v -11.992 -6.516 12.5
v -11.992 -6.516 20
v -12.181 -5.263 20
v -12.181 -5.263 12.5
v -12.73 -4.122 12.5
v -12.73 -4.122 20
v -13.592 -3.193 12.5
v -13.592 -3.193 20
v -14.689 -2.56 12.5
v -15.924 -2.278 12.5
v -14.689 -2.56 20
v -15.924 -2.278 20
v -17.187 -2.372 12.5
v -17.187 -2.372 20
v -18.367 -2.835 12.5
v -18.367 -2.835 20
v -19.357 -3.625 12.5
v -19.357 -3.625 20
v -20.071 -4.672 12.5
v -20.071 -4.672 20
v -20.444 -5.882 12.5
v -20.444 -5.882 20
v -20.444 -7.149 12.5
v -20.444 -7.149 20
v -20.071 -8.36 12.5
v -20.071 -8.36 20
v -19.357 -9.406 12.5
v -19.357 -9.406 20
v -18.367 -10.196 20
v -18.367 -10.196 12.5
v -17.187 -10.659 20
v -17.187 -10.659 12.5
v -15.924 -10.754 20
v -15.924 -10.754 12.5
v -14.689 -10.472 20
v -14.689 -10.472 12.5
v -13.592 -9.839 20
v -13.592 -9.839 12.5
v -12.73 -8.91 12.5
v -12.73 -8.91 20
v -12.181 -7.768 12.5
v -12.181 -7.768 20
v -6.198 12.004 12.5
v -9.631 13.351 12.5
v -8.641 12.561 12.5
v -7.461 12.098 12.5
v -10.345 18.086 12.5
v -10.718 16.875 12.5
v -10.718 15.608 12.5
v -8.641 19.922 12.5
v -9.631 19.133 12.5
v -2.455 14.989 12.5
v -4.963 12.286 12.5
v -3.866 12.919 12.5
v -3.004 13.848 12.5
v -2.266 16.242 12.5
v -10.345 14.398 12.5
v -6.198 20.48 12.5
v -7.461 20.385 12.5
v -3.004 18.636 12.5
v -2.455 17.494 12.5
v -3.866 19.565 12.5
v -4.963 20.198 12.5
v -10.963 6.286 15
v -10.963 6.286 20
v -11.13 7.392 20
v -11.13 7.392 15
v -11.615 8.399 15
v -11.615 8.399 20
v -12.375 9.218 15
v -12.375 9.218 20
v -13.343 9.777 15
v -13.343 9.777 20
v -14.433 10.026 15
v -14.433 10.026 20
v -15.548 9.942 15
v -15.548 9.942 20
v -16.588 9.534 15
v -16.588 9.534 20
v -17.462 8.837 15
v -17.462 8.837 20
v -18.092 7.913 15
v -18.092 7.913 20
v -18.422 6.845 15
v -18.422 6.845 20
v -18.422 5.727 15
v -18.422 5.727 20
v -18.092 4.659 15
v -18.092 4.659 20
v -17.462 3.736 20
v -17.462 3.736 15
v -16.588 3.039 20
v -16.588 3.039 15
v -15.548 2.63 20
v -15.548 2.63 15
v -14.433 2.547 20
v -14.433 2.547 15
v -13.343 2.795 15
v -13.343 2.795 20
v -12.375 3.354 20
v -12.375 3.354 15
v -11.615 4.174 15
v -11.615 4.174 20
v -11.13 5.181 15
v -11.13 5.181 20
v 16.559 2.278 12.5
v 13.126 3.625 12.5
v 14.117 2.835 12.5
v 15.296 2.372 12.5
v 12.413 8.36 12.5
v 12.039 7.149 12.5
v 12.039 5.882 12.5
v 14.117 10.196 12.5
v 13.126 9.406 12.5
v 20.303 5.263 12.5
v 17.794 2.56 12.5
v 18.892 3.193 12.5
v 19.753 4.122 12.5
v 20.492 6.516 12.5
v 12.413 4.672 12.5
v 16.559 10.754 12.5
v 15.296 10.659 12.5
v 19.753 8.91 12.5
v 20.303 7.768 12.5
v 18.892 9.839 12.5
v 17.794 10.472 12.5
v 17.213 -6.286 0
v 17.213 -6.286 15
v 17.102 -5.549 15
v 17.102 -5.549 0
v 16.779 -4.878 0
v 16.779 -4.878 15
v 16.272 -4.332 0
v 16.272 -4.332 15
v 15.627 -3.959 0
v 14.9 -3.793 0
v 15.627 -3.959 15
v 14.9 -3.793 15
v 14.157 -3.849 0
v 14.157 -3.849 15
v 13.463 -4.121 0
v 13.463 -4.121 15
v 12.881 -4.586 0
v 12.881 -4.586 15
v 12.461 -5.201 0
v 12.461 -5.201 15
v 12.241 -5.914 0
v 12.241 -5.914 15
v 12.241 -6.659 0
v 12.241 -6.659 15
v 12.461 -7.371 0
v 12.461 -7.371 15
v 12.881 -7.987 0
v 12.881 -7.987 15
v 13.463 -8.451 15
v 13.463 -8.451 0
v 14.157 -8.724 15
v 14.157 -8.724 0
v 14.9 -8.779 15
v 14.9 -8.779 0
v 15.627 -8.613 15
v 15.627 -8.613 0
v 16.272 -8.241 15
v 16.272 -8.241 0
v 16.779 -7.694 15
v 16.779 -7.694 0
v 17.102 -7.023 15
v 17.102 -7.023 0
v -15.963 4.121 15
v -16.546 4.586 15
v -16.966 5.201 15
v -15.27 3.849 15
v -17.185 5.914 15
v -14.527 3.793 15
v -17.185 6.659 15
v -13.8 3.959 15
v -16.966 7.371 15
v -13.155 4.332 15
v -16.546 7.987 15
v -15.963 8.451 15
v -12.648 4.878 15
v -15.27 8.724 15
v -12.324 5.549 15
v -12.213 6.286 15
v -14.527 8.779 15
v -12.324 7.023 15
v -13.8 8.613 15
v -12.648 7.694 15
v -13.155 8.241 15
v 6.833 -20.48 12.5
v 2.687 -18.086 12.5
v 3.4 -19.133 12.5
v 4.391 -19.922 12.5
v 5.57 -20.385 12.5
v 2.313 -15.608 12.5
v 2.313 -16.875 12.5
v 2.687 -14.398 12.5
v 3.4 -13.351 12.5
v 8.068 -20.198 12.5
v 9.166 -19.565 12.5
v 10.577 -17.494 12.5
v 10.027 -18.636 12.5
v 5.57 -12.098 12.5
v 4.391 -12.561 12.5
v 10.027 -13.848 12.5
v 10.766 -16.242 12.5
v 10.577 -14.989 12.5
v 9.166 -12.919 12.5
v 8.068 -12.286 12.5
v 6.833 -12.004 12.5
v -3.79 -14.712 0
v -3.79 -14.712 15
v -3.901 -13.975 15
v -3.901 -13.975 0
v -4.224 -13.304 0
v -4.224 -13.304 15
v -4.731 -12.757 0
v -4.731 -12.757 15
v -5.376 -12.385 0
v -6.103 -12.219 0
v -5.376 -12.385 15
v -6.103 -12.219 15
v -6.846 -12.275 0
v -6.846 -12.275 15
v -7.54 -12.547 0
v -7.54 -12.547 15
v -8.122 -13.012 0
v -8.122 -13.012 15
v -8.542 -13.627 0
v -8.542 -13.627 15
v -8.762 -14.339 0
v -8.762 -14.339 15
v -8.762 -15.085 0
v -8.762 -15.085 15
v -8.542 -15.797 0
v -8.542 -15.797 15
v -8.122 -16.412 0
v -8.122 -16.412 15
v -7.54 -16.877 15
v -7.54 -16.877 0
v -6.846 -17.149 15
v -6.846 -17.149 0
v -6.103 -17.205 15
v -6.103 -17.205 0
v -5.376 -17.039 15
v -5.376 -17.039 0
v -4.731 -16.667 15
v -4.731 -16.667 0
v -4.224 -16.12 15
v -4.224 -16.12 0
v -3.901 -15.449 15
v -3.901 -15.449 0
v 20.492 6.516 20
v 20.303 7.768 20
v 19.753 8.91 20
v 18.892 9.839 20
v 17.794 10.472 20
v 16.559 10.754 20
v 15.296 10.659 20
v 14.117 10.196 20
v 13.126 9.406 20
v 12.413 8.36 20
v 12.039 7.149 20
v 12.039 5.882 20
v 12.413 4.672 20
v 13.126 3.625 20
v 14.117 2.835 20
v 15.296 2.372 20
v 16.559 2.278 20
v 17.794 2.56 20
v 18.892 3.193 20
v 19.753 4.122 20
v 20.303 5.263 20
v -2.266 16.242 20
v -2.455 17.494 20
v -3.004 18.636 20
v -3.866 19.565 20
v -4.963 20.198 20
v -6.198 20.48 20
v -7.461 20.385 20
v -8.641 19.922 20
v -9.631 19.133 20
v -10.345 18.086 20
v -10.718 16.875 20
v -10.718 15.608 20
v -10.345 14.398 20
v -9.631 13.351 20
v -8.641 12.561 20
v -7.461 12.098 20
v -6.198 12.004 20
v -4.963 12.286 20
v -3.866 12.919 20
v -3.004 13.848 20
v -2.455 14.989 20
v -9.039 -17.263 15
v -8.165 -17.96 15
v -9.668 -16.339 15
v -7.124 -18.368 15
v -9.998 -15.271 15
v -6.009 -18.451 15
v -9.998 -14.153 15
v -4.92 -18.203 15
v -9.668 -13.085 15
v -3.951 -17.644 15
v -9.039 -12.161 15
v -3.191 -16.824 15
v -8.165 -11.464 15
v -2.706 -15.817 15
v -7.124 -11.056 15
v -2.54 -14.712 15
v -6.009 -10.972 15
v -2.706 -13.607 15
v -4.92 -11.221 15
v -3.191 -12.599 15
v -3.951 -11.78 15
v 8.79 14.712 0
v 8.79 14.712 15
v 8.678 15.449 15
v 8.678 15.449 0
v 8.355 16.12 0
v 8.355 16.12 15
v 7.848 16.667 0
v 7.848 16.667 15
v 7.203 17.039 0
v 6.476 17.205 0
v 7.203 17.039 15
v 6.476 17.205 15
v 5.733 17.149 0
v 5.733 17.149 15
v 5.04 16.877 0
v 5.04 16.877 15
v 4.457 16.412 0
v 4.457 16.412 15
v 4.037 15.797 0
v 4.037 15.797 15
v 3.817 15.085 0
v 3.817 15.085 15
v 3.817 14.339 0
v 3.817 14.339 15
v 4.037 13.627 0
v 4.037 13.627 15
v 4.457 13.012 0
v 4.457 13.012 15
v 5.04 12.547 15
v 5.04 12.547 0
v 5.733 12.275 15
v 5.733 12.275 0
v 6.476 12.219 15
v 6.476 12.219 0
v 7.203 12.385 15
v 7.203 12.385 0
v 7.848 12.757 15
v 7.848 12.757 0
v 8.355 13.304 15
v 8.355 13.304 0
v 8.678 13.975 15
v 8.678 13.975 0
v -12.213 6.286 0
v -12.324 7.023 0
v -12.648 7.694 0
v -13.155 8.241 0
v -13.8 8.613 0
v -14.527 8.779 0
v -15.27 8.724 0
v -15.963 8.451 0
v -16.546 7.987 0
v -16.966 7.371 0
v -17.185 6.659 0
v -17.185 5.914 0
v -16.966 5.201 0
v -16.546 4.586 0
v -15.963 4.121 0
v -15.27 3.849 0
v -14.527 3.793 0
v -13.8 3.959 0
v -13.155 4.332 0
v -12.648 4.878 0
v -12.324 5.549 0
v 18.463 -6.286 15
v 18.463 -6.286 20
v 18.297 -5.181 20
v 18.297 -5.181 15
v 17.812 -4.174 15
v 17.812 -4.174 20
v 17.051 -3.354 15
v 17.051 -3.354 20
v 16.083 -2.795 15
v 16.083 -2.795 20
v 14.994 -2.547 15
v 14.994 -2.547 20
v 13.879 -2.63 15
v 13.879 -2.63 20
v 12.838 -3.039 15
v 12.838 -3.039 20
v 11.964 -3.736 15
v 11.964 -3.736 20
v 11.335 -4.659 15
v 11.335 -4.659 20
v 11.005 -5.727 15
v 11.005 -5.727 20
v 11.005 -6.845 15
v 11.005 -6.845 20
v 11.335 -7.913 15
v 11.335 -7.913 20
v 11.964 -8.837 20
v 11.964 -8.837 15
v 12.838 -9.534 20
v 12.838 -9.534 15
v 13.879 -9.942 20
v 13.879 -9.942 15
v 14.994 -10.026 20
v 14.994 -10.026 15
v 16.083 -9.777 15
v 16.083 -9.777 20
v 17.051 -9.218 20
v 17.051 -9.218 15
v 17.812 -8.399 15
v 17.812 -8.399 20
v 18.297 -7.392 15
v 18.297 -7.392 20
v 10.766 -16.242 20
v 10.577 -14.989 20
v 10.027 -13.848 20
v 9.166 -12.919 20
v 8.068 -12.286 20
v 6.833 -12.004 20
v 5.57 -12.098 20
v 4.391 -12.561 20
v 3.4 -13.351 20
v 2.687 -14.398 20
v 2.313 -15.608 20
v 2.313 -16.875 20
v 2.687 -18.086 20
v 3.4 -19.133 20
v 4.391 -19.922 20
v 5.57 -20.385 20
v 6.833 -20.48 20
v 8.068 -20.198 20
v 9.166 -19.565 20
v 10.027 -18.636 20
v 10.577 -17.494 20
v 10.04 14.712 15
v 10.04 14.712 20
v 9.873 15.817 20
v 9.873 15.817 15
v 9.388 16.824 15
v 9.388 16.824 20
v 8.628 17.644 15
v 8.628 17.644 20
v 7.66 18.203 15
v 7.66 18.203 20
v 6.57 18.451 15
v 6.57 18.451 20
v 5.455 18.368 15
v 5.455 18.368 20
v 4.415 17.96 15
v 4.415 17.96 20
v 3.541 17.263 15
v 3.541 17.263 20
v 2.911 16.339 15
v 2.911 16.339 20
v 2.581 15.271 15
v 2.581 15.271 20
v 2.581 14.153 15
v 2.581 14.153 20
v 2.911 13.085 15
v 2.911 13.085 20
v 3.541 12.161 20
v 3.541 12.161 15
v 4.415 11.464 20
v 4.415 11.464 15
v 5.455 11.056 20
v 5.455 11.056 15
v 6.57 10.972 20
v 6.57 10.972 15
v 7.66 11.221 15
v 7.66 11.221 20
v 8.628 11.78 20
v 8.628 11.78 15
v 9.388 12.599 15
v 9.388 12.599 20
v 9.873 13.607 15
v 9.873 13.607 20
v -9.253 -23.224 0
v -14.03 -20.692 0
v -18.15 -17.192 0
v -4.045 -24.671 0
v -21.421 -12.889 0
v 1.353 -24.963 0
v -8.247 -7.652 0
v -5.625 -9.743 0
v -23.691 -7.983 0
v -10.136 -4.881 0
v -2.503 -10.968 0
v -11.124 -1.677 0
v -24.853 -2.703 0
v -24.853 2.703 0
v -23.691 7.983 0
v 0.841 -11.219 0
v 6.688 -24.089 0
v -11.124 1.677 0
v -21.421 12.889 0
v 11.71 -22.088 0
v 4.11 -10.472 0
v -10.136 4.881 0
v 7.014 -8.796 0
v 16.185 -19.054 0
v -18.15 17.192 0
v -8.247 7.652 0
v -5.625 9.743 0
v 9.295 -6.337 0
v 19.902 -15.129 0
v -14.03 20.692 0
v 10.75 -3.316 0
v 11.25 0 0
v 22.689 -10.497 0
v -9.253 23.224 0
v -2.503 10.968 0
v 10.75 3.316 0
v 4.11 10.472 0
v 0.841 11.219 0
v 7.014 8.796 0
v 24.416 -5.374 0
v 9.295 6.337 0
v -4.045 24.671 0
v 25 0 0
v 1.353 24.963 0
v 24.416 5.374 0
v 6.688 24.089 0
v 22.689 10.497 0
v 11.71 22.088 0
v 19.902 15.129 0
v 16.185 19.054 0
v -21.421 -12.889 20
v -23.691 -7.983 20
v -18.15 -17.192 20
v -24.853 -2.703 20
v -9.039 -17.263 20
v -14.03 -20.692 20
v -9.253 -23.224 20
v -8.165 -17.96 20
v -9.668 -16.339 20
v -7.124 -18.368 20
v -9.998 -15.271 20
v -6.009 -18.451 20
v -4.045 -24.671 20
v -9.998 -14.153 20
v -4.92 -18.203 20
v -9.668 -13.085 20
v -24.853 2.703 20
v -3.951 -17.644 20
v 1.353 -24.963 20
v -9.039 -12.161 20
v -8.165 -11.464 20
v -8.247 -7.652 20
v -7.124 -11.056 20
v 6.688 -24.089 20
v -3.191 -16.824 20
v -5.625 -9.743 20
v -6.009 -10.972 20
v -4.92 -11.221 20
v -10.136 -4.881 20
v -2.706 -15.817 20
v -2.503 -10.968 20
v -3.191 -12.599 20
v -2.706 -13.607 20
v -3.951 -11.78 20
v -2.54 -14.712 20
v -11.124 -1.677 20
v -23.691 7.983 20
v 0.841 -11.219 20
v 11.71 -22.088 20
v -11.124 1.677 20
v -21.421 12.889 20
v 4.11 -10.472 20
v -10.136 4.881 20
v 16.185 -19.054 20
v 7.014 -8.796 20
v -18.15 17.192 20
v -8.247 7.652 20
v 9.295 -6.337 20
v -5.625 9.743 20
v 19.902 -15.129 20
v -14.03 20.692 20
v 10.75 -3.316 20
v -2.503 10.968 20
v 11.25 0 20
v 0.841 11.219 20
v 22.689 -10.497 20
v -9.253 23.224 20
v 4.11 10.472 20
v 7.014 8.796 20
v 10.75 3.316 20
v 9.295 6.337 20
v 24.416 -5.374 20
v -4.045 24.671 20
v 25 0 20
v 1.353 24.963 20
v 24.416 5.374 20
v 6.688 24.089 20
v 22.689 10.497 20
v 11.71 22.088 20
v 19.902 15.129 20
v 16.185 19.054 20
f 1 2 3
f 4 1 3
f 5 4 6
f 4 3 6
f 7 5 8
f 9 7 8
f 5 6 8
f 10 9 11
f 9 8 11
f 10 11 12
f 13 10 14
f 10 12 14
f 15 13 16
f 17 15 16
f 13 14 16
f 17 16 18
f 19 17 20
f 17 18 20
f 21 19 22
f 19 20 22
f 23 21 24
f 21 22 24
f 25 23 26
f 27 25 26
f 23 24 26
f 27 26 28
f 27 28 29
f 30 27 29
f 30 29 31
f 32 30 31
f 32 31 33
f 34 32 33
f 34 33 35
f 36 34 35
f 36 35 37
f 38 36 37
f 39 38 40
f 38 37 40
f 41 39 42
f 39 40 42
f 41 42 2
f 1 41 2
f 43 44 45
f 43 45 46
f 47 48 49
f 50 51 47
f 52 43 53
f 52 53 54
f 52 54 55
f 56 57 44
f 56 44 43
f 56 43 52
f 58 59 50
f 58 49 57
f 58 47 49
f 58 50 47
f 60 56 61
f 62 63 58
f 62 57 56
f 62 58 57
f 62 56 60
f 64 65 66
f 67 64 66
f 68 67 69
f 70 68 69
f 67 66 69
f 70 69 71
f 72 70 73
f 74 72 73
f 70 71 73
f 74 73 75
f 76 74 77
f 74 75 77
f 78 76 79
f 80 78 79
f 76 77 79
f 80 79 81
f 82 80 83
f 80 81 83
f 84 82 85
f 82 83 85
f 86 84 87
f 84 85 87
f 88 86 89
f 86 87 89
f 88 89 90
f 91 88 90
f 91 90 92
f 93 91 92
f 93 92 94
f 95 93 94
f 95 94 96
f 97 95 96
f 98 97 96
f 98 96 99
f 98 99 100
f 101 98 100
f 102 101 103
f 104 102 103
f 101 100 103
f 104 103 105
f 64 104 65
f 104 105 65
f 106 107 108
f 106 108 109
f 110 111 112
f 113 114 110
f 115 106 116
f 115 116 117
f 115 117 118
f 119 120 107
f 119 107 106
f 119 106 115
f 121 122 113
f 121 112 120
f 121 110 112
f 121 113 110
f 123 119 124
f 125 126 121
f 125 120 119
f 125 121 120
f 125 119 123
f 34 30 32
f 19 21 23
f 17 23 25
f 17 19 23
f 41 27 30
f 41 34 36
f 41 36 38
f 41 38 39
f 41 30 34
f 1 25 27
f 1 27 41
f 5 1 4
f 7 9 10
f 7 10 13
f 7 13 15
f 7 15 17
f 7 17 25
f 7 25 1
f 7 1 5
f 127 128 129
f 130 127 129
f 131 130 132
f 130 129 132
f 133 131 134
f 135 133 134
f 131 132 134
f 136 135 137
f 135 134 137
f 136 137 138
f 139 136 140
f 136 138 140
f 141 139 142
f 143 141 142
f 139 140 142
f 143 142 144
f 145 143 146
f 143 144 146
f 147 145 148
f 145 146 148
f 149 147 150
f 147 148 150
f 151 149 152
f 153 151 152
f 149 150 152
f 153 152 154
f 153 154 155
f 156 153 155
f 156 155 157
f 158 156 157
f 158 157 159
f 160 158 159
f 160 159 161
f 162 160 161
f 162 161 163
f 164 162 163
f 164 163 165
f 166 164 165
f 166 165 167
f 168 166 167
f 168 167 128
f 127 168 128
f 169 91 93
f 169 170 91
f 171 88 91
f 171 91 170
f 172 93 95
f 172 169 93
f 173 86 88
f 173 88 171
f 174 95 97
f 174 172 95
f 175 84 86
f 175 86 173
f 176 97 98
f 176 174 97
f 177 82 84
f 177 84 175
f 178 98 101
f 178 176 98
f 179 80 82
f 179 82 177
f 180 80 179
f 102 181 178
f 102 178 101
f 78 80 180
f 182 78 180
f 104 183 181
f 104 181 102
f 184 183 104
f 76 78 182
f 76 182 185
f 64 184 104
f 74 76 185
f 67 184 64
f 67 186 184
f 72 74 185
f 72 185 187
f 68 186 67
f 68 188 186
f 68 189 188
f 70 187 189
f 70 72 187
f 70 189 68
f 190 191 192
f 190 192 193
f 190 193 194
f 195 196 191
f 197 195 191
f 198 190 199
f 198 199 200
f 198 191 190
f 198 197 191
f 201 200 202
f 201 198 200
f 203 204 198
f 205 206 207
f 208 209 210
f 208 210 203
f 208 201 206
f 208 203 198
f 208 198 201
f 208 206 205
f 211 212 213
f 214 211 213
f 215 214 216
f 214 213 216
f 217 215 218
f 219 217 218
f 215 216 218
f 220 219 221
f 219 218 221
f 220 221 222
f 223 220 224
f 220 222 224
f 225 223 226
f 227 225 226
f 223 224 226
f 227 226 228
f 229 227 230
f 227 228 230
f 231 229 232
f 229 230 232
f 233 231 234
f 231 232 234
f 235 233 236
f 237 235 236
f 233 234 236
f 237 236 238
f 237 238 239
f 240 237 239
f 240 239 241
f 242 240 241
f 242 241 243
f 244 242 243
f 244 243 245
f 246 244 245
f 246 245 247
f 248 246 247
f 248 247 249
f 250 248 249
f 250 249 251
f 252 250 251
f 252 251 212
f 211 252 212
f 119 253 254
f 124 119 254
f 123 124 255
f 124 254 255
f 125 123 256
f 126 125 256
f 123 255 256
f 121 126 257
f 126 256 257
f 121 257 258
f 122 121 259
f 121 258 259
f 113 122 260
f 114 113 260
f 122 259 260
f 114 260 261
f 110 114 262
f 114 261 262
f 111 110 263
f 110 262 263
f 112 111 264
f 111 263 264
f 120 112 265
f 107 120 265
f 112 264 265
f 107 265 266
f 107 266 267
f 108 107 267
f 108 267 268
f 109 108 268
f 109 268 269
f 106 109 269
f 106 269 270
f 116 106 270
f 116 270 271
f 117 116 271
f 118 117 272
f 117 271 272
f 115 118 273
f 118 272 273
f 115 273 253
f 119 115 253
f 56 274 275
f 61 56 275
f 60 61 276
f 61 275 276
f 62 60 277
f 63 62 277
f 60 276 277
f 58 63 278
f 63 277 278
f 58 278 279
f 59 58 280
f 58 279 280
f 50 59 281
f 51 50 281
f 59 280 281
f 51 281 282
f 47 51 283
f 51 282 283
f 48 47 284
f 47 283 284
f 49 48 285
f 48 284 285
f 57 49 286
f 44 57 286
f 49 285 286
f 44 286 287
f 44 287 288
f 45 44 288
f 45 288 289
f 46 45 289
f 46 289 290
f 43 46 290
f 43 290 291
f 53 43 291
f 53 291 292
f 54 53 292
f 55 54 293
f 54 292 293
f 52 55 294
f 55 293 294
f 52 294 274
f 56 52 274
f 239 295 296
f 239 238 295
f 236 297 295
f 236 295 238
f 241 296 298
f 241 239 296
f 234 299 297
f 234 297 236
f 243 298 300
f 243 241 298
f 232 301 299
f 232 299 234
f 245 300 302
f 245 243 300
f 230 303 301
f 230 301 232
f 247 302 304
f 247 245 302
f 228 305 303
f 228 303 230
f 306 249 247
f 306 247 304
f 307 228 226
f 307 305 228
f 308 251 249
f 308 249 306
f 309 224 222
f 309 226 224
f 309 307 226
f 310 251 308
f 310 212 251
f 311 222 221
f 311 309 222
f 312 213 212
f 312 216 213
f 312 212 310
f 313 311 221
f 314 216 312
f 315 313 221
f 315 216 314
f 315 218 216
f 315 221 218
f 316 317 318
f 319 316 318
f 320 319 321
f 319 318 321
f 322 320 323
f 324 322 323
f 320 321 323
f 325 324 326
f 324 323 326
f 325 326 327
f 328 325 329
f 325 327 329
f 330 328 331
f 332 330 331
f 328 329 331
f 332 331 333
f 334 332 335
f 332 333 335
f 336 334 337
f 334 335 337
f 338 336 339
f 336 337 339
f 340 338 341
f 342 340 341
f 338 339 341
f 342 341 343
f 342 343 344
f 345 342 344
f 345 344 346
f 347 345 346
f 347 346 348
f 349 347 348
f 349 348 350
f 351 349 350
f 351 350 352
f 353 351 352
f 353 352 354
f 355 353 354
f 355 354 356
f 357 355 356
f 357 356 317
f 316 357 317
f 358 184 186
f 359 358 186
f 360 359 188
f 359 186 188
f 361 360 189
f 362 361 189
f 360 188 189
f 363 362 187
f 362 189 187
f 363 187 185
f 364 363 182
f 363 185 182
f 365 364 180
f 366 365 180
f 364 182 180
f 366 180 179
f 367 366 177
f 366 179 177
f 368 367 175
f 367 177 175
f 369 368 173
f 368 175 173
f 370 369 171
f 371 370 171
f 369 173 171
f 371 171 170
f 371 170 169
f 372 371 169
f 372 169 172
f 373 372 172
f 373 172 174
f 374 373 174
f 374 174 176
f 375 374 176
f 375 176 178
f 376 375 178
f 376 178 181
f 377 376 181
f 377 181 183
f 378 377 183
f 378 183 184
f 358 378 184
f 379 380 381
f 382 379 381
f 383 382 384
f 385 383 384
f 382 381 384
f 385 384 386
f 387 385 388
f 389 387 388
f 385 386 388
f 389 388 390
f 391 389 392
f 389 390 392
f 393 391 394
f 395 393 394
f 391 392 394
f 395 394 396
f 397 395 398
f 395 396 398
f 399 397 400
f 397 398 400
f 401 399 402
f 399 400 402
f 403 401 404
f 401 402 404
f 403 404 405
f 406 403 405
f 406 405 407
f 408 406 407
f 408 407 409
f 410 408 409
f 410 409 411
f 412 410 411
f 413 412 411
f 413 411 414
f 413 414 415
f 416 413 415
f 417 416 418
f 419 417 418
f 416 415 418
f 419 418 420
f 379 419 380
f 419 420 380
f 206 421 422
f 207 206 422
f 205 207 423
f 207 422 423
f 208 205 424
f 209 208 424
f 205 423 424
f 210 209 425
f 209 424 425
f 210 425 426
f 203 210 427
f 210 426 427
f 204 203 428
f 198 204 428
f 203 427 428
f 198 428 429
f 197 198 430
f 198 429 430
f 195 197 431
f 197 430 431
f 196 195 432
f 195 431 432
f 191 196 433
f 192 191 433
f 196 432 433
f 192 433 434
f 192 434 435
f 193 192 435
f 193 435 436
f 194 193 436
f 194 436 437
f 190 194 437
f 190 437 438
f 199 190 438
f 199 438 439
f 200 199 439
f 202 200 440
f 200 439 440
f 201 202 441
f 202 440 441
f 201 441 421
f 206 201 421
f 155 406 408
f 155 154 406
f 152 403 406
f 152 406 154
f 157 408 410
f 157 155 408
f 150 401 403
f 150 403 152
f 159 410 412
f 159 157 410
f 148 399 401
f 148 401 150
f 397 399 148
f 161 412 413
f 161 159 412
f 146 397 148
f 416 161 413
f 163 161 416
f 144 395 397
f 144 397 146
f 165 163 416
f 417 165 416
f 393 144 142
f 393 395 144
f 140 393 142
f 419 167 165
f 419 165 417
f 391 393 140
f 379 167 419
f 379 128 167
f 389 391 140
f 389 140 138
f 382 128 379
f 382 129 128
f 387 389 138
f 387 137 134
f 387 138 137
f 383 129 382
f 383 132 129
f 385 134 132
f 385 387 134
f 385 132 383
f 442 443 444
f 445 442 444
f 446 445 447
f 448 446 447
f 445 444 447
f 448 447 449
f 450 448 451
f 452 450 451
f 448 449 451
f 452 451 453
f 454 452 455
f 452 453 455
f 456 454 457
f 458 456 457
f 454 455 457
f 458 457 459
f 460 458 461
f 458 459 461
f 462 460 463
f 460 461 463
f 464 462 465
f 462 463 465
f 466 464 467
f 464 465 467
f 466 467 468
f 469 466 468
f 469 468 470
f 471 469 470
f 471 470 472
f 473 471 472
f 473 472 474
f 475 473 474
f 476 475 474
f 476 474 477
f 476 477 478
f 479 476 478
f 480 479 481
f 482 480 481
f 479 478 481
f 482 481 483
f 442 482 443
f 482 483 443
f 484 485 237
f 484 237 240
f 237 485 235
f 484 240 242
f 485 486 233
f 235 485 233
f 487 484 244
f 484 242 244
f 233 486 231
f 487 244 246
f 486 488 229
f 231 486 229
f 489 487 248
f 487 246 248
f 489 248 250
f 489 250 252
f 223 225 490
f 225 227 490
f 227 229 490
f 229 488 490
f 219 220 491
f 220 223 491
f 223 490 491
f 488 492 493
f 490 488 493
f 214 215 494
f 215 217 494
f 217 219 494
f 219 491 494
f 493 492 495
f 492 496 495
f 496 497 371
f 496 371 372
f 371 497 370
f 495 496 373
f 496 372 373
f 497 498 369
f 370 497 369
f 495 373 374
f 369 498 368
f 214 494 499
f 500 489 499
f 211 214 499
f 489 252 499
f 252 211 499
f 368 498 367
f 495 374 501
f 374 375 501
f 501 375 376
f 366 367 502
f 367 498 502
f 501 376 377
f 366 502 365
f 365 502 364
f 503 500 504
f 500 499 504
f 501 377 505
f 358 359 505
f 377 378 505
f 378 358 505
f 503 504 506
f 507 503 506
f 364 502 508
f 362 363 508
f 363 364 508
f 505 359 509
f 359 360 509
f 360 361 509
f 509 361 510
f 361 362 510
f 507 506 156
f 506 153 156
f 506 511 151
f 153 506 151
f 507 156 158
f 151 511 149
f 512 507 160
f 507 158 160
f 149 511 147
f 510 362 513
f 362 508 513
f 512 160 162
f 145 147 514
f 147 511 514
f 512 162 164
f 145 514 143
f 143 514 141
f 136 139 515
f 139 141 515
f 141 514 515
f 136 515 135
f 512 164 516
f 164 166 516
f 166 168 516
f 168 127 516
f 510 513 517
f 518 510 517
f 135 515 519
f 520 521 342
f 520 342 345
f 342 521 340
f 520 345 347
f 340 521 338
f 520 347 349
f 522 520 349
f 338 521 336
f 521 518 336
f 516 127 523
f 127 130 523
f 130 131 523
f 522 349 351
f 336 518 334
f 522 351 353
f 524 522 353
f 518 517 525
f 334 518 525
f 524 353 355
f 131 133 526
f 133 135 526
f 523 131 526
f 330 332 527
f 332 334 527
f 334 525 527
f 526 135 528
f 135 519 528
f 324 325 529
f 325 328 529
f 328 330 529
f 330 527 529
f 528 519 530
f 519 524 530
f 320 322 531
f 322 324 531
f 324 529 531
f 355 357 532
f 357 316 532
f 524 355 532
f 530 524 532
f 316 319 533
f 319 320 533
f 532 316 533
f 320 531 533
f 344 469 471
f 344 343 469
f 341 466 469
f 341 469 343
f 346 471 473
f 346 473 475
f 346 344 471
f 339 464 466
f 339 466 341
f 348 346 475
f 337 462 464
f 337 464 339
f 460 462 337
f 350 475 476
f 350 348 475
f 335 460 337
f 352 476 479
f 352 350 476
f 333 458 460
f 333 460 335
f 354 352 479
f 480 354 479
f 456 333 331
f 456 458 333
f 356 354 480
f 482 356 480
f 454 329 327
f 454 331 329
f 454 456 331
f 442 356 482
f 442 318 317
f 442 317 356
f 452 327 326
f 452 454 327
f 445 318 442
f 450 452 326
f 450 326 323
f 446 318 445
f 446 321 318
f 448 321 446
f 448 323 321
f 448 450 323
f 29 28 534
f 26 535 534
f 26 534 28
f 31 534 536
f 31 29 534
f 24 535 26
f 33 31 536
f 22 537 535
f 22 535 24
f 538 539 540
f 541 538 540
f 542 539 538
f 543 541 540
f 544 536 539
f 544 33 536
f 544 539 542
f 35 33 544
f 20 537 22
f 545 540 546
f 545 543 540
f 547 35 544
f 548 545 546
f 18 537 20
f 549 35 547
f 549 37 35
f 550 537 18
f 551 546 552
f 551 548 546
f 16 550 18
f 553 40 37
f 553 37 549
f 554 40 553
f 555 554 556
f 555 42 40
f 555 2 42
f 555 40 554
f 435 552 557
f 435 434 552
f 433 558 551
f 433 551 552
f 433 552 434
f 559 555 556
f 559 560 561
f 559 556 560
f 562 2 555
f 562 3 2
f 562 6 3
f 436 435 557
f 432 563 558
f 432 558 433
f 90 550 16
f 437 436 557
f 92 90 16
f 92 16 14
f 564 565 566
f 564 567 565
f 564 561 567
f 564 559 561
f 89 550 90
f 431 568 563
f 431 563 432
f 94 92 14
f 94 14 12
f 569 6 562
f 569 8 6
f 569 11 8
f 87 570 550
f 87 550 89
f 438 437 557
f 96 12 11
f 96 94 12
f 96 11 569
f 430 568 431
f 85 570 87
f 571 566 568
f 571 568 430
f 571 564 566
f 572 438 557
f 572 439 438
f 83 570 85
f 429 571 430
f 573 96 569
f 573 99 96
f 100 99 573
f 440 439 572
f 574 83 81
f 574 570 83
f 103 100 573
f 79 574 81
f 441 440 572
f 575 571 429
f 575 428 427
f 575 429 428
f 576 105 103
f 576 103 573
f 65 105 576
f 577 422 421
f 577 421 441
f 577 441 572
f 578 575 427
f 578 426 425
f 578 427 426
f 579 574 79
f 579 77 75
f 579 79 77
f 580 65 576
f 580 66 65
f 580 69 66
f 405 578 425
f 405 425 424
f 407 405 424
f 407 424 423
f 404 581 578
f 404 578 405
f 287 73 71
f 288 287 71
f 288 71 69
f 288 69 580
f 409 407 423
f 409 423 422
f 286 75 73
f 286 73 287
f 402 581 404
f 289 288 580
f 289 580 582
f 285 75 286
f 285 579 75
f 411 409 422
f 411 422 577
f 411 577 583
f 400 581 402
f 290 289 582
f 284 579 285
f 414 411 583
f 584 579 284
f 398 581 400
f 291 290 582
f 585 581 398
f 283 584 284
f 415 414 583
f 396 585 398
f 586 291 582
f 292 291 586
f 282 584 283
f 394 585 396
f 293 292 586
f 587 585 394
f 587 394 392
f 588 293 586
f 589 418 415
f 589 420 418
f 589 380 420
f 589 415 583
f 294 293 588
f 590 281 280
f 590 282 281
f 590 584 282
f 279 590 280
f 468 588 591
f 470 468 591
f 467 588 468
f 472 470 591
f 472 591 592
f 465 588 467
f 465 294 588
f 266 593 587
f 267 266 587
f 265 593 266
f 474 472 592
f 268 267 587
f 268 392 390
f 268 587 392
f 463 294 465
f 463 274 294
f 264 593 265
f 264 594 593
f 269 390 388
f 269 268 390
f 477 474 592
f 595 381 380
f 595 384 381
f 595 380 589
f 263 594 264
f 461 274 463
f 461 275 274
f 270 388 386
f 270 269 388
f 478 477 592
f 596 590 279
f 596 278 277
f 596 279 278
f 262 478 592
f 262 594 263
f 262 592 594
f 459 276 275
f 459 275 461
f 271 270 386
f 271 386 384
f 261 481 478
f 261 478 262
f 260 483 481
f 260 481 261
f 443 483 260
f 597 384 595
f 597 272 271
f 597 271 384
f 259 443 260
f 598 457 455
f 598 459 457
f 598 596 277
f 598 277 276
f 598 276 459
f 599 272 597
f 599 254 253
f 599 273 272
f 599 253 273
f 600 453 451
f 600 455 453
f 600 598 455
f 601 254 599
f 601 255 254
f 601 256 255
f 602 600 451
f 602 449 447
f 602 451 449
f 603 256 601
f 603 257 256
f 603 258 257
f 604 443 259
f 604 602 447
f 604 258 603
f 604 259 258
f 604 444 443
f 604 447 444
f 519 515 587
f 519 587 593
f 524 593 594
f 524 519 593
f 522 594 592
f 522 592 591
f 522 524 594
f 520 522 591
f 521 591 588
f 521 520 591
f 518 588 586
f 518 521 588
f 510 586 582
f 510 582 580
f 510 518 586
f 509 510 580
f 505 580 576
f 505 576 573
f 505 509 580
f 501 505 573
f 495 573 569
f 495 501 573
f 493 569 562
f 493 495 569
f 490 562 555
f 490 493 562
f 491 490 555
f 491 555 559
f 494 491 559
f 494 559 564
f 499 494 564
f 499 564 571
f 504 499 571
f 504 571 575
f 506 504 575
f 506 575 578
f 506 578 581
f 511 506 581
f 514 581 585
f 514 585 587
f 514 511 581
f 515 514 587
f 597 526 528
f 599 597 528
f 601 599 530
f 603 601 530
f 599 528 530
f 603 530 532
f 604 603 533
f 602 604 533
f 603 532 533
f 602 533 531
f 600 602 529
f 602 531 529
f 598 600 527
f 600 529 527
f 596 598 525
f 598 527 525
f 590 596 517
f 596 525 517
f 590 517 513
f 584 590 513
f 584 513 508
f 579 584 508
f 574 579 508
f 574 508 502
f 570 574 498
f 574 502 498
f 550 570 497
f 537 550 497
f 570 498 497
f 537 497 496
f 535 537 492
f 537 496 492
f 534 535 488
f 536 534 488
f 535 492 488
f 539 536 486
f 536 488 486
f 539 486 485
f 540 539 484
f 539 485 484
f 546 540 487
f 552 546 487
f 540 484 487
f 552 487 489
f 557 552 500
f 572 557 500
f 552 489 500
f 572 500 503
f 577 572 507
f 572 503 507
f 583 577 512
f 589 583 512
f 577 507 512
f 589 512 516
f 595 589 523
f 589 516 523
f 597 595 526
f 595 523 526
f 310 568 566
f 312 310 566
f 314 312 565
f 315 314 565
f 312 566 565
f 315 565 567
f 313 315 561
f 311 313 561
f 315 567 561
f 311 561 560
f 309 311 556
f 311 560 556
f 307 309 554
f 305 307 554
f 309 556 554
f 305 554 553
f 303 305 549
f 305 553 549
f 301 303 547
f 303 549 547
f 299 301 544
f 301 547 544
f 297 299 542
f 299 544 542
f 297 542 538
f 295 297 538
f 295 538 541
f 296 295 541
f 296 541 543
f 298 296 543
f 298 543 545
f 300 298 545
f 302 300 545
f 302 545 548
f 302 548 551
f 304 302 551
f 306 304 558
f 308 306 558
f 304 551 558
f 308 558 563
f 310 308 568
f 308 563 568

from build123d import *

# Parameters (mm, degrees)
ESQUISSE1_R             = 25
ESQUISSE1_R_2           = 11.25
BOSS_EXTRU_1_DEPTH      = 20
ESQUISSE2_R             = 2.5
ENL_V_MAT_EXTRU_1_DEPTH = 41.620192023
ESQUISSE4_R             = 3.75
ENL_V_MAT_EXTRU_2_DEPTH = 5
ESQUISSE12_R            = 4.25
ENL_V_MAT_EXTRU_6_DEPTH = 7.5


with BuildPart() as part:
    # Esquisse1 → Boss.-Extru.1 (new body)
    with BuildSketch(Plane.XY):
        Circle(ESQUISSE1_R)
        Circle(ESQUISSE1_R_2, mode=Mode.SUBTRACT)
    extrude(amount=BOSS_EXTRU_1_DEPTH)

    # Esquisse2 → Enlèv. mat.-Extru.1 (cut, through all)
    with BuildSketch(Plane.XY.offset(20)):
        with Locations((-14.713385832, 6.286197369)):
            Circle(ESQUISSE2_R)
        with Locations((6.28955657, 14.711950182)):
            Circle(ESQUISSE2_R)
        with Locations((14.713385832, -6.286197369)):
            Circle(ESQUISSE2_R)
        with Locations((-6.28955657, -14.711950182)):
            Circle(ESQUISSE2_R)
    extrude(amount=-ENL_V_MAT_EXTRU_1_DEPTH, mode=Mode.SUBTRACT)

    # Esquisse4 → Enlèv. mat.-Extru.2 (cut)
    with BuildSketch(Plane.XY.offset(20)):
        with Locations((-6.28955657, -14.711950182)):
            Circle(ESQUISSE4_R)
        with Locations((14.713385832, -6.286197369)):
            Circle(ESQUISSE4_R)
        with Locations((6.28955657, 14.711950182)):
            Circle(ESQUISSE4_R)
        with Locations((-14.713385832, 6.286197369)):
            Circle(ESQUISSE4_R)
    extrude(amount=-ENL_V_MAT_EXTRU_2_DEPTH, mode=Mode.SUBTRACT)

    # Esquisse12 → Enlèv. mat.-Extru.6 (cut)
    with BuildSketch(Plane.XY.offset(20)):
        with Locations((16.24178047, 6.515716934)):
            Circle(ESQUISSE12_R)
        with Locations((-16.24178047, -6.515716934)):
            Circle(ESQUISSE12_R)
        with Locations((6.515716934, -16.24178047)):
            Circle(ESQUISSE12_R)
        with Locations((-6.515716934, 16.24178047)):
            Circle(ESQUISSE12_R)
    extrude(amount=-ENL_V_MAT_EXTRU_6_DEPTH, mode=Mode.SUBTRACT)


solid = part.part
